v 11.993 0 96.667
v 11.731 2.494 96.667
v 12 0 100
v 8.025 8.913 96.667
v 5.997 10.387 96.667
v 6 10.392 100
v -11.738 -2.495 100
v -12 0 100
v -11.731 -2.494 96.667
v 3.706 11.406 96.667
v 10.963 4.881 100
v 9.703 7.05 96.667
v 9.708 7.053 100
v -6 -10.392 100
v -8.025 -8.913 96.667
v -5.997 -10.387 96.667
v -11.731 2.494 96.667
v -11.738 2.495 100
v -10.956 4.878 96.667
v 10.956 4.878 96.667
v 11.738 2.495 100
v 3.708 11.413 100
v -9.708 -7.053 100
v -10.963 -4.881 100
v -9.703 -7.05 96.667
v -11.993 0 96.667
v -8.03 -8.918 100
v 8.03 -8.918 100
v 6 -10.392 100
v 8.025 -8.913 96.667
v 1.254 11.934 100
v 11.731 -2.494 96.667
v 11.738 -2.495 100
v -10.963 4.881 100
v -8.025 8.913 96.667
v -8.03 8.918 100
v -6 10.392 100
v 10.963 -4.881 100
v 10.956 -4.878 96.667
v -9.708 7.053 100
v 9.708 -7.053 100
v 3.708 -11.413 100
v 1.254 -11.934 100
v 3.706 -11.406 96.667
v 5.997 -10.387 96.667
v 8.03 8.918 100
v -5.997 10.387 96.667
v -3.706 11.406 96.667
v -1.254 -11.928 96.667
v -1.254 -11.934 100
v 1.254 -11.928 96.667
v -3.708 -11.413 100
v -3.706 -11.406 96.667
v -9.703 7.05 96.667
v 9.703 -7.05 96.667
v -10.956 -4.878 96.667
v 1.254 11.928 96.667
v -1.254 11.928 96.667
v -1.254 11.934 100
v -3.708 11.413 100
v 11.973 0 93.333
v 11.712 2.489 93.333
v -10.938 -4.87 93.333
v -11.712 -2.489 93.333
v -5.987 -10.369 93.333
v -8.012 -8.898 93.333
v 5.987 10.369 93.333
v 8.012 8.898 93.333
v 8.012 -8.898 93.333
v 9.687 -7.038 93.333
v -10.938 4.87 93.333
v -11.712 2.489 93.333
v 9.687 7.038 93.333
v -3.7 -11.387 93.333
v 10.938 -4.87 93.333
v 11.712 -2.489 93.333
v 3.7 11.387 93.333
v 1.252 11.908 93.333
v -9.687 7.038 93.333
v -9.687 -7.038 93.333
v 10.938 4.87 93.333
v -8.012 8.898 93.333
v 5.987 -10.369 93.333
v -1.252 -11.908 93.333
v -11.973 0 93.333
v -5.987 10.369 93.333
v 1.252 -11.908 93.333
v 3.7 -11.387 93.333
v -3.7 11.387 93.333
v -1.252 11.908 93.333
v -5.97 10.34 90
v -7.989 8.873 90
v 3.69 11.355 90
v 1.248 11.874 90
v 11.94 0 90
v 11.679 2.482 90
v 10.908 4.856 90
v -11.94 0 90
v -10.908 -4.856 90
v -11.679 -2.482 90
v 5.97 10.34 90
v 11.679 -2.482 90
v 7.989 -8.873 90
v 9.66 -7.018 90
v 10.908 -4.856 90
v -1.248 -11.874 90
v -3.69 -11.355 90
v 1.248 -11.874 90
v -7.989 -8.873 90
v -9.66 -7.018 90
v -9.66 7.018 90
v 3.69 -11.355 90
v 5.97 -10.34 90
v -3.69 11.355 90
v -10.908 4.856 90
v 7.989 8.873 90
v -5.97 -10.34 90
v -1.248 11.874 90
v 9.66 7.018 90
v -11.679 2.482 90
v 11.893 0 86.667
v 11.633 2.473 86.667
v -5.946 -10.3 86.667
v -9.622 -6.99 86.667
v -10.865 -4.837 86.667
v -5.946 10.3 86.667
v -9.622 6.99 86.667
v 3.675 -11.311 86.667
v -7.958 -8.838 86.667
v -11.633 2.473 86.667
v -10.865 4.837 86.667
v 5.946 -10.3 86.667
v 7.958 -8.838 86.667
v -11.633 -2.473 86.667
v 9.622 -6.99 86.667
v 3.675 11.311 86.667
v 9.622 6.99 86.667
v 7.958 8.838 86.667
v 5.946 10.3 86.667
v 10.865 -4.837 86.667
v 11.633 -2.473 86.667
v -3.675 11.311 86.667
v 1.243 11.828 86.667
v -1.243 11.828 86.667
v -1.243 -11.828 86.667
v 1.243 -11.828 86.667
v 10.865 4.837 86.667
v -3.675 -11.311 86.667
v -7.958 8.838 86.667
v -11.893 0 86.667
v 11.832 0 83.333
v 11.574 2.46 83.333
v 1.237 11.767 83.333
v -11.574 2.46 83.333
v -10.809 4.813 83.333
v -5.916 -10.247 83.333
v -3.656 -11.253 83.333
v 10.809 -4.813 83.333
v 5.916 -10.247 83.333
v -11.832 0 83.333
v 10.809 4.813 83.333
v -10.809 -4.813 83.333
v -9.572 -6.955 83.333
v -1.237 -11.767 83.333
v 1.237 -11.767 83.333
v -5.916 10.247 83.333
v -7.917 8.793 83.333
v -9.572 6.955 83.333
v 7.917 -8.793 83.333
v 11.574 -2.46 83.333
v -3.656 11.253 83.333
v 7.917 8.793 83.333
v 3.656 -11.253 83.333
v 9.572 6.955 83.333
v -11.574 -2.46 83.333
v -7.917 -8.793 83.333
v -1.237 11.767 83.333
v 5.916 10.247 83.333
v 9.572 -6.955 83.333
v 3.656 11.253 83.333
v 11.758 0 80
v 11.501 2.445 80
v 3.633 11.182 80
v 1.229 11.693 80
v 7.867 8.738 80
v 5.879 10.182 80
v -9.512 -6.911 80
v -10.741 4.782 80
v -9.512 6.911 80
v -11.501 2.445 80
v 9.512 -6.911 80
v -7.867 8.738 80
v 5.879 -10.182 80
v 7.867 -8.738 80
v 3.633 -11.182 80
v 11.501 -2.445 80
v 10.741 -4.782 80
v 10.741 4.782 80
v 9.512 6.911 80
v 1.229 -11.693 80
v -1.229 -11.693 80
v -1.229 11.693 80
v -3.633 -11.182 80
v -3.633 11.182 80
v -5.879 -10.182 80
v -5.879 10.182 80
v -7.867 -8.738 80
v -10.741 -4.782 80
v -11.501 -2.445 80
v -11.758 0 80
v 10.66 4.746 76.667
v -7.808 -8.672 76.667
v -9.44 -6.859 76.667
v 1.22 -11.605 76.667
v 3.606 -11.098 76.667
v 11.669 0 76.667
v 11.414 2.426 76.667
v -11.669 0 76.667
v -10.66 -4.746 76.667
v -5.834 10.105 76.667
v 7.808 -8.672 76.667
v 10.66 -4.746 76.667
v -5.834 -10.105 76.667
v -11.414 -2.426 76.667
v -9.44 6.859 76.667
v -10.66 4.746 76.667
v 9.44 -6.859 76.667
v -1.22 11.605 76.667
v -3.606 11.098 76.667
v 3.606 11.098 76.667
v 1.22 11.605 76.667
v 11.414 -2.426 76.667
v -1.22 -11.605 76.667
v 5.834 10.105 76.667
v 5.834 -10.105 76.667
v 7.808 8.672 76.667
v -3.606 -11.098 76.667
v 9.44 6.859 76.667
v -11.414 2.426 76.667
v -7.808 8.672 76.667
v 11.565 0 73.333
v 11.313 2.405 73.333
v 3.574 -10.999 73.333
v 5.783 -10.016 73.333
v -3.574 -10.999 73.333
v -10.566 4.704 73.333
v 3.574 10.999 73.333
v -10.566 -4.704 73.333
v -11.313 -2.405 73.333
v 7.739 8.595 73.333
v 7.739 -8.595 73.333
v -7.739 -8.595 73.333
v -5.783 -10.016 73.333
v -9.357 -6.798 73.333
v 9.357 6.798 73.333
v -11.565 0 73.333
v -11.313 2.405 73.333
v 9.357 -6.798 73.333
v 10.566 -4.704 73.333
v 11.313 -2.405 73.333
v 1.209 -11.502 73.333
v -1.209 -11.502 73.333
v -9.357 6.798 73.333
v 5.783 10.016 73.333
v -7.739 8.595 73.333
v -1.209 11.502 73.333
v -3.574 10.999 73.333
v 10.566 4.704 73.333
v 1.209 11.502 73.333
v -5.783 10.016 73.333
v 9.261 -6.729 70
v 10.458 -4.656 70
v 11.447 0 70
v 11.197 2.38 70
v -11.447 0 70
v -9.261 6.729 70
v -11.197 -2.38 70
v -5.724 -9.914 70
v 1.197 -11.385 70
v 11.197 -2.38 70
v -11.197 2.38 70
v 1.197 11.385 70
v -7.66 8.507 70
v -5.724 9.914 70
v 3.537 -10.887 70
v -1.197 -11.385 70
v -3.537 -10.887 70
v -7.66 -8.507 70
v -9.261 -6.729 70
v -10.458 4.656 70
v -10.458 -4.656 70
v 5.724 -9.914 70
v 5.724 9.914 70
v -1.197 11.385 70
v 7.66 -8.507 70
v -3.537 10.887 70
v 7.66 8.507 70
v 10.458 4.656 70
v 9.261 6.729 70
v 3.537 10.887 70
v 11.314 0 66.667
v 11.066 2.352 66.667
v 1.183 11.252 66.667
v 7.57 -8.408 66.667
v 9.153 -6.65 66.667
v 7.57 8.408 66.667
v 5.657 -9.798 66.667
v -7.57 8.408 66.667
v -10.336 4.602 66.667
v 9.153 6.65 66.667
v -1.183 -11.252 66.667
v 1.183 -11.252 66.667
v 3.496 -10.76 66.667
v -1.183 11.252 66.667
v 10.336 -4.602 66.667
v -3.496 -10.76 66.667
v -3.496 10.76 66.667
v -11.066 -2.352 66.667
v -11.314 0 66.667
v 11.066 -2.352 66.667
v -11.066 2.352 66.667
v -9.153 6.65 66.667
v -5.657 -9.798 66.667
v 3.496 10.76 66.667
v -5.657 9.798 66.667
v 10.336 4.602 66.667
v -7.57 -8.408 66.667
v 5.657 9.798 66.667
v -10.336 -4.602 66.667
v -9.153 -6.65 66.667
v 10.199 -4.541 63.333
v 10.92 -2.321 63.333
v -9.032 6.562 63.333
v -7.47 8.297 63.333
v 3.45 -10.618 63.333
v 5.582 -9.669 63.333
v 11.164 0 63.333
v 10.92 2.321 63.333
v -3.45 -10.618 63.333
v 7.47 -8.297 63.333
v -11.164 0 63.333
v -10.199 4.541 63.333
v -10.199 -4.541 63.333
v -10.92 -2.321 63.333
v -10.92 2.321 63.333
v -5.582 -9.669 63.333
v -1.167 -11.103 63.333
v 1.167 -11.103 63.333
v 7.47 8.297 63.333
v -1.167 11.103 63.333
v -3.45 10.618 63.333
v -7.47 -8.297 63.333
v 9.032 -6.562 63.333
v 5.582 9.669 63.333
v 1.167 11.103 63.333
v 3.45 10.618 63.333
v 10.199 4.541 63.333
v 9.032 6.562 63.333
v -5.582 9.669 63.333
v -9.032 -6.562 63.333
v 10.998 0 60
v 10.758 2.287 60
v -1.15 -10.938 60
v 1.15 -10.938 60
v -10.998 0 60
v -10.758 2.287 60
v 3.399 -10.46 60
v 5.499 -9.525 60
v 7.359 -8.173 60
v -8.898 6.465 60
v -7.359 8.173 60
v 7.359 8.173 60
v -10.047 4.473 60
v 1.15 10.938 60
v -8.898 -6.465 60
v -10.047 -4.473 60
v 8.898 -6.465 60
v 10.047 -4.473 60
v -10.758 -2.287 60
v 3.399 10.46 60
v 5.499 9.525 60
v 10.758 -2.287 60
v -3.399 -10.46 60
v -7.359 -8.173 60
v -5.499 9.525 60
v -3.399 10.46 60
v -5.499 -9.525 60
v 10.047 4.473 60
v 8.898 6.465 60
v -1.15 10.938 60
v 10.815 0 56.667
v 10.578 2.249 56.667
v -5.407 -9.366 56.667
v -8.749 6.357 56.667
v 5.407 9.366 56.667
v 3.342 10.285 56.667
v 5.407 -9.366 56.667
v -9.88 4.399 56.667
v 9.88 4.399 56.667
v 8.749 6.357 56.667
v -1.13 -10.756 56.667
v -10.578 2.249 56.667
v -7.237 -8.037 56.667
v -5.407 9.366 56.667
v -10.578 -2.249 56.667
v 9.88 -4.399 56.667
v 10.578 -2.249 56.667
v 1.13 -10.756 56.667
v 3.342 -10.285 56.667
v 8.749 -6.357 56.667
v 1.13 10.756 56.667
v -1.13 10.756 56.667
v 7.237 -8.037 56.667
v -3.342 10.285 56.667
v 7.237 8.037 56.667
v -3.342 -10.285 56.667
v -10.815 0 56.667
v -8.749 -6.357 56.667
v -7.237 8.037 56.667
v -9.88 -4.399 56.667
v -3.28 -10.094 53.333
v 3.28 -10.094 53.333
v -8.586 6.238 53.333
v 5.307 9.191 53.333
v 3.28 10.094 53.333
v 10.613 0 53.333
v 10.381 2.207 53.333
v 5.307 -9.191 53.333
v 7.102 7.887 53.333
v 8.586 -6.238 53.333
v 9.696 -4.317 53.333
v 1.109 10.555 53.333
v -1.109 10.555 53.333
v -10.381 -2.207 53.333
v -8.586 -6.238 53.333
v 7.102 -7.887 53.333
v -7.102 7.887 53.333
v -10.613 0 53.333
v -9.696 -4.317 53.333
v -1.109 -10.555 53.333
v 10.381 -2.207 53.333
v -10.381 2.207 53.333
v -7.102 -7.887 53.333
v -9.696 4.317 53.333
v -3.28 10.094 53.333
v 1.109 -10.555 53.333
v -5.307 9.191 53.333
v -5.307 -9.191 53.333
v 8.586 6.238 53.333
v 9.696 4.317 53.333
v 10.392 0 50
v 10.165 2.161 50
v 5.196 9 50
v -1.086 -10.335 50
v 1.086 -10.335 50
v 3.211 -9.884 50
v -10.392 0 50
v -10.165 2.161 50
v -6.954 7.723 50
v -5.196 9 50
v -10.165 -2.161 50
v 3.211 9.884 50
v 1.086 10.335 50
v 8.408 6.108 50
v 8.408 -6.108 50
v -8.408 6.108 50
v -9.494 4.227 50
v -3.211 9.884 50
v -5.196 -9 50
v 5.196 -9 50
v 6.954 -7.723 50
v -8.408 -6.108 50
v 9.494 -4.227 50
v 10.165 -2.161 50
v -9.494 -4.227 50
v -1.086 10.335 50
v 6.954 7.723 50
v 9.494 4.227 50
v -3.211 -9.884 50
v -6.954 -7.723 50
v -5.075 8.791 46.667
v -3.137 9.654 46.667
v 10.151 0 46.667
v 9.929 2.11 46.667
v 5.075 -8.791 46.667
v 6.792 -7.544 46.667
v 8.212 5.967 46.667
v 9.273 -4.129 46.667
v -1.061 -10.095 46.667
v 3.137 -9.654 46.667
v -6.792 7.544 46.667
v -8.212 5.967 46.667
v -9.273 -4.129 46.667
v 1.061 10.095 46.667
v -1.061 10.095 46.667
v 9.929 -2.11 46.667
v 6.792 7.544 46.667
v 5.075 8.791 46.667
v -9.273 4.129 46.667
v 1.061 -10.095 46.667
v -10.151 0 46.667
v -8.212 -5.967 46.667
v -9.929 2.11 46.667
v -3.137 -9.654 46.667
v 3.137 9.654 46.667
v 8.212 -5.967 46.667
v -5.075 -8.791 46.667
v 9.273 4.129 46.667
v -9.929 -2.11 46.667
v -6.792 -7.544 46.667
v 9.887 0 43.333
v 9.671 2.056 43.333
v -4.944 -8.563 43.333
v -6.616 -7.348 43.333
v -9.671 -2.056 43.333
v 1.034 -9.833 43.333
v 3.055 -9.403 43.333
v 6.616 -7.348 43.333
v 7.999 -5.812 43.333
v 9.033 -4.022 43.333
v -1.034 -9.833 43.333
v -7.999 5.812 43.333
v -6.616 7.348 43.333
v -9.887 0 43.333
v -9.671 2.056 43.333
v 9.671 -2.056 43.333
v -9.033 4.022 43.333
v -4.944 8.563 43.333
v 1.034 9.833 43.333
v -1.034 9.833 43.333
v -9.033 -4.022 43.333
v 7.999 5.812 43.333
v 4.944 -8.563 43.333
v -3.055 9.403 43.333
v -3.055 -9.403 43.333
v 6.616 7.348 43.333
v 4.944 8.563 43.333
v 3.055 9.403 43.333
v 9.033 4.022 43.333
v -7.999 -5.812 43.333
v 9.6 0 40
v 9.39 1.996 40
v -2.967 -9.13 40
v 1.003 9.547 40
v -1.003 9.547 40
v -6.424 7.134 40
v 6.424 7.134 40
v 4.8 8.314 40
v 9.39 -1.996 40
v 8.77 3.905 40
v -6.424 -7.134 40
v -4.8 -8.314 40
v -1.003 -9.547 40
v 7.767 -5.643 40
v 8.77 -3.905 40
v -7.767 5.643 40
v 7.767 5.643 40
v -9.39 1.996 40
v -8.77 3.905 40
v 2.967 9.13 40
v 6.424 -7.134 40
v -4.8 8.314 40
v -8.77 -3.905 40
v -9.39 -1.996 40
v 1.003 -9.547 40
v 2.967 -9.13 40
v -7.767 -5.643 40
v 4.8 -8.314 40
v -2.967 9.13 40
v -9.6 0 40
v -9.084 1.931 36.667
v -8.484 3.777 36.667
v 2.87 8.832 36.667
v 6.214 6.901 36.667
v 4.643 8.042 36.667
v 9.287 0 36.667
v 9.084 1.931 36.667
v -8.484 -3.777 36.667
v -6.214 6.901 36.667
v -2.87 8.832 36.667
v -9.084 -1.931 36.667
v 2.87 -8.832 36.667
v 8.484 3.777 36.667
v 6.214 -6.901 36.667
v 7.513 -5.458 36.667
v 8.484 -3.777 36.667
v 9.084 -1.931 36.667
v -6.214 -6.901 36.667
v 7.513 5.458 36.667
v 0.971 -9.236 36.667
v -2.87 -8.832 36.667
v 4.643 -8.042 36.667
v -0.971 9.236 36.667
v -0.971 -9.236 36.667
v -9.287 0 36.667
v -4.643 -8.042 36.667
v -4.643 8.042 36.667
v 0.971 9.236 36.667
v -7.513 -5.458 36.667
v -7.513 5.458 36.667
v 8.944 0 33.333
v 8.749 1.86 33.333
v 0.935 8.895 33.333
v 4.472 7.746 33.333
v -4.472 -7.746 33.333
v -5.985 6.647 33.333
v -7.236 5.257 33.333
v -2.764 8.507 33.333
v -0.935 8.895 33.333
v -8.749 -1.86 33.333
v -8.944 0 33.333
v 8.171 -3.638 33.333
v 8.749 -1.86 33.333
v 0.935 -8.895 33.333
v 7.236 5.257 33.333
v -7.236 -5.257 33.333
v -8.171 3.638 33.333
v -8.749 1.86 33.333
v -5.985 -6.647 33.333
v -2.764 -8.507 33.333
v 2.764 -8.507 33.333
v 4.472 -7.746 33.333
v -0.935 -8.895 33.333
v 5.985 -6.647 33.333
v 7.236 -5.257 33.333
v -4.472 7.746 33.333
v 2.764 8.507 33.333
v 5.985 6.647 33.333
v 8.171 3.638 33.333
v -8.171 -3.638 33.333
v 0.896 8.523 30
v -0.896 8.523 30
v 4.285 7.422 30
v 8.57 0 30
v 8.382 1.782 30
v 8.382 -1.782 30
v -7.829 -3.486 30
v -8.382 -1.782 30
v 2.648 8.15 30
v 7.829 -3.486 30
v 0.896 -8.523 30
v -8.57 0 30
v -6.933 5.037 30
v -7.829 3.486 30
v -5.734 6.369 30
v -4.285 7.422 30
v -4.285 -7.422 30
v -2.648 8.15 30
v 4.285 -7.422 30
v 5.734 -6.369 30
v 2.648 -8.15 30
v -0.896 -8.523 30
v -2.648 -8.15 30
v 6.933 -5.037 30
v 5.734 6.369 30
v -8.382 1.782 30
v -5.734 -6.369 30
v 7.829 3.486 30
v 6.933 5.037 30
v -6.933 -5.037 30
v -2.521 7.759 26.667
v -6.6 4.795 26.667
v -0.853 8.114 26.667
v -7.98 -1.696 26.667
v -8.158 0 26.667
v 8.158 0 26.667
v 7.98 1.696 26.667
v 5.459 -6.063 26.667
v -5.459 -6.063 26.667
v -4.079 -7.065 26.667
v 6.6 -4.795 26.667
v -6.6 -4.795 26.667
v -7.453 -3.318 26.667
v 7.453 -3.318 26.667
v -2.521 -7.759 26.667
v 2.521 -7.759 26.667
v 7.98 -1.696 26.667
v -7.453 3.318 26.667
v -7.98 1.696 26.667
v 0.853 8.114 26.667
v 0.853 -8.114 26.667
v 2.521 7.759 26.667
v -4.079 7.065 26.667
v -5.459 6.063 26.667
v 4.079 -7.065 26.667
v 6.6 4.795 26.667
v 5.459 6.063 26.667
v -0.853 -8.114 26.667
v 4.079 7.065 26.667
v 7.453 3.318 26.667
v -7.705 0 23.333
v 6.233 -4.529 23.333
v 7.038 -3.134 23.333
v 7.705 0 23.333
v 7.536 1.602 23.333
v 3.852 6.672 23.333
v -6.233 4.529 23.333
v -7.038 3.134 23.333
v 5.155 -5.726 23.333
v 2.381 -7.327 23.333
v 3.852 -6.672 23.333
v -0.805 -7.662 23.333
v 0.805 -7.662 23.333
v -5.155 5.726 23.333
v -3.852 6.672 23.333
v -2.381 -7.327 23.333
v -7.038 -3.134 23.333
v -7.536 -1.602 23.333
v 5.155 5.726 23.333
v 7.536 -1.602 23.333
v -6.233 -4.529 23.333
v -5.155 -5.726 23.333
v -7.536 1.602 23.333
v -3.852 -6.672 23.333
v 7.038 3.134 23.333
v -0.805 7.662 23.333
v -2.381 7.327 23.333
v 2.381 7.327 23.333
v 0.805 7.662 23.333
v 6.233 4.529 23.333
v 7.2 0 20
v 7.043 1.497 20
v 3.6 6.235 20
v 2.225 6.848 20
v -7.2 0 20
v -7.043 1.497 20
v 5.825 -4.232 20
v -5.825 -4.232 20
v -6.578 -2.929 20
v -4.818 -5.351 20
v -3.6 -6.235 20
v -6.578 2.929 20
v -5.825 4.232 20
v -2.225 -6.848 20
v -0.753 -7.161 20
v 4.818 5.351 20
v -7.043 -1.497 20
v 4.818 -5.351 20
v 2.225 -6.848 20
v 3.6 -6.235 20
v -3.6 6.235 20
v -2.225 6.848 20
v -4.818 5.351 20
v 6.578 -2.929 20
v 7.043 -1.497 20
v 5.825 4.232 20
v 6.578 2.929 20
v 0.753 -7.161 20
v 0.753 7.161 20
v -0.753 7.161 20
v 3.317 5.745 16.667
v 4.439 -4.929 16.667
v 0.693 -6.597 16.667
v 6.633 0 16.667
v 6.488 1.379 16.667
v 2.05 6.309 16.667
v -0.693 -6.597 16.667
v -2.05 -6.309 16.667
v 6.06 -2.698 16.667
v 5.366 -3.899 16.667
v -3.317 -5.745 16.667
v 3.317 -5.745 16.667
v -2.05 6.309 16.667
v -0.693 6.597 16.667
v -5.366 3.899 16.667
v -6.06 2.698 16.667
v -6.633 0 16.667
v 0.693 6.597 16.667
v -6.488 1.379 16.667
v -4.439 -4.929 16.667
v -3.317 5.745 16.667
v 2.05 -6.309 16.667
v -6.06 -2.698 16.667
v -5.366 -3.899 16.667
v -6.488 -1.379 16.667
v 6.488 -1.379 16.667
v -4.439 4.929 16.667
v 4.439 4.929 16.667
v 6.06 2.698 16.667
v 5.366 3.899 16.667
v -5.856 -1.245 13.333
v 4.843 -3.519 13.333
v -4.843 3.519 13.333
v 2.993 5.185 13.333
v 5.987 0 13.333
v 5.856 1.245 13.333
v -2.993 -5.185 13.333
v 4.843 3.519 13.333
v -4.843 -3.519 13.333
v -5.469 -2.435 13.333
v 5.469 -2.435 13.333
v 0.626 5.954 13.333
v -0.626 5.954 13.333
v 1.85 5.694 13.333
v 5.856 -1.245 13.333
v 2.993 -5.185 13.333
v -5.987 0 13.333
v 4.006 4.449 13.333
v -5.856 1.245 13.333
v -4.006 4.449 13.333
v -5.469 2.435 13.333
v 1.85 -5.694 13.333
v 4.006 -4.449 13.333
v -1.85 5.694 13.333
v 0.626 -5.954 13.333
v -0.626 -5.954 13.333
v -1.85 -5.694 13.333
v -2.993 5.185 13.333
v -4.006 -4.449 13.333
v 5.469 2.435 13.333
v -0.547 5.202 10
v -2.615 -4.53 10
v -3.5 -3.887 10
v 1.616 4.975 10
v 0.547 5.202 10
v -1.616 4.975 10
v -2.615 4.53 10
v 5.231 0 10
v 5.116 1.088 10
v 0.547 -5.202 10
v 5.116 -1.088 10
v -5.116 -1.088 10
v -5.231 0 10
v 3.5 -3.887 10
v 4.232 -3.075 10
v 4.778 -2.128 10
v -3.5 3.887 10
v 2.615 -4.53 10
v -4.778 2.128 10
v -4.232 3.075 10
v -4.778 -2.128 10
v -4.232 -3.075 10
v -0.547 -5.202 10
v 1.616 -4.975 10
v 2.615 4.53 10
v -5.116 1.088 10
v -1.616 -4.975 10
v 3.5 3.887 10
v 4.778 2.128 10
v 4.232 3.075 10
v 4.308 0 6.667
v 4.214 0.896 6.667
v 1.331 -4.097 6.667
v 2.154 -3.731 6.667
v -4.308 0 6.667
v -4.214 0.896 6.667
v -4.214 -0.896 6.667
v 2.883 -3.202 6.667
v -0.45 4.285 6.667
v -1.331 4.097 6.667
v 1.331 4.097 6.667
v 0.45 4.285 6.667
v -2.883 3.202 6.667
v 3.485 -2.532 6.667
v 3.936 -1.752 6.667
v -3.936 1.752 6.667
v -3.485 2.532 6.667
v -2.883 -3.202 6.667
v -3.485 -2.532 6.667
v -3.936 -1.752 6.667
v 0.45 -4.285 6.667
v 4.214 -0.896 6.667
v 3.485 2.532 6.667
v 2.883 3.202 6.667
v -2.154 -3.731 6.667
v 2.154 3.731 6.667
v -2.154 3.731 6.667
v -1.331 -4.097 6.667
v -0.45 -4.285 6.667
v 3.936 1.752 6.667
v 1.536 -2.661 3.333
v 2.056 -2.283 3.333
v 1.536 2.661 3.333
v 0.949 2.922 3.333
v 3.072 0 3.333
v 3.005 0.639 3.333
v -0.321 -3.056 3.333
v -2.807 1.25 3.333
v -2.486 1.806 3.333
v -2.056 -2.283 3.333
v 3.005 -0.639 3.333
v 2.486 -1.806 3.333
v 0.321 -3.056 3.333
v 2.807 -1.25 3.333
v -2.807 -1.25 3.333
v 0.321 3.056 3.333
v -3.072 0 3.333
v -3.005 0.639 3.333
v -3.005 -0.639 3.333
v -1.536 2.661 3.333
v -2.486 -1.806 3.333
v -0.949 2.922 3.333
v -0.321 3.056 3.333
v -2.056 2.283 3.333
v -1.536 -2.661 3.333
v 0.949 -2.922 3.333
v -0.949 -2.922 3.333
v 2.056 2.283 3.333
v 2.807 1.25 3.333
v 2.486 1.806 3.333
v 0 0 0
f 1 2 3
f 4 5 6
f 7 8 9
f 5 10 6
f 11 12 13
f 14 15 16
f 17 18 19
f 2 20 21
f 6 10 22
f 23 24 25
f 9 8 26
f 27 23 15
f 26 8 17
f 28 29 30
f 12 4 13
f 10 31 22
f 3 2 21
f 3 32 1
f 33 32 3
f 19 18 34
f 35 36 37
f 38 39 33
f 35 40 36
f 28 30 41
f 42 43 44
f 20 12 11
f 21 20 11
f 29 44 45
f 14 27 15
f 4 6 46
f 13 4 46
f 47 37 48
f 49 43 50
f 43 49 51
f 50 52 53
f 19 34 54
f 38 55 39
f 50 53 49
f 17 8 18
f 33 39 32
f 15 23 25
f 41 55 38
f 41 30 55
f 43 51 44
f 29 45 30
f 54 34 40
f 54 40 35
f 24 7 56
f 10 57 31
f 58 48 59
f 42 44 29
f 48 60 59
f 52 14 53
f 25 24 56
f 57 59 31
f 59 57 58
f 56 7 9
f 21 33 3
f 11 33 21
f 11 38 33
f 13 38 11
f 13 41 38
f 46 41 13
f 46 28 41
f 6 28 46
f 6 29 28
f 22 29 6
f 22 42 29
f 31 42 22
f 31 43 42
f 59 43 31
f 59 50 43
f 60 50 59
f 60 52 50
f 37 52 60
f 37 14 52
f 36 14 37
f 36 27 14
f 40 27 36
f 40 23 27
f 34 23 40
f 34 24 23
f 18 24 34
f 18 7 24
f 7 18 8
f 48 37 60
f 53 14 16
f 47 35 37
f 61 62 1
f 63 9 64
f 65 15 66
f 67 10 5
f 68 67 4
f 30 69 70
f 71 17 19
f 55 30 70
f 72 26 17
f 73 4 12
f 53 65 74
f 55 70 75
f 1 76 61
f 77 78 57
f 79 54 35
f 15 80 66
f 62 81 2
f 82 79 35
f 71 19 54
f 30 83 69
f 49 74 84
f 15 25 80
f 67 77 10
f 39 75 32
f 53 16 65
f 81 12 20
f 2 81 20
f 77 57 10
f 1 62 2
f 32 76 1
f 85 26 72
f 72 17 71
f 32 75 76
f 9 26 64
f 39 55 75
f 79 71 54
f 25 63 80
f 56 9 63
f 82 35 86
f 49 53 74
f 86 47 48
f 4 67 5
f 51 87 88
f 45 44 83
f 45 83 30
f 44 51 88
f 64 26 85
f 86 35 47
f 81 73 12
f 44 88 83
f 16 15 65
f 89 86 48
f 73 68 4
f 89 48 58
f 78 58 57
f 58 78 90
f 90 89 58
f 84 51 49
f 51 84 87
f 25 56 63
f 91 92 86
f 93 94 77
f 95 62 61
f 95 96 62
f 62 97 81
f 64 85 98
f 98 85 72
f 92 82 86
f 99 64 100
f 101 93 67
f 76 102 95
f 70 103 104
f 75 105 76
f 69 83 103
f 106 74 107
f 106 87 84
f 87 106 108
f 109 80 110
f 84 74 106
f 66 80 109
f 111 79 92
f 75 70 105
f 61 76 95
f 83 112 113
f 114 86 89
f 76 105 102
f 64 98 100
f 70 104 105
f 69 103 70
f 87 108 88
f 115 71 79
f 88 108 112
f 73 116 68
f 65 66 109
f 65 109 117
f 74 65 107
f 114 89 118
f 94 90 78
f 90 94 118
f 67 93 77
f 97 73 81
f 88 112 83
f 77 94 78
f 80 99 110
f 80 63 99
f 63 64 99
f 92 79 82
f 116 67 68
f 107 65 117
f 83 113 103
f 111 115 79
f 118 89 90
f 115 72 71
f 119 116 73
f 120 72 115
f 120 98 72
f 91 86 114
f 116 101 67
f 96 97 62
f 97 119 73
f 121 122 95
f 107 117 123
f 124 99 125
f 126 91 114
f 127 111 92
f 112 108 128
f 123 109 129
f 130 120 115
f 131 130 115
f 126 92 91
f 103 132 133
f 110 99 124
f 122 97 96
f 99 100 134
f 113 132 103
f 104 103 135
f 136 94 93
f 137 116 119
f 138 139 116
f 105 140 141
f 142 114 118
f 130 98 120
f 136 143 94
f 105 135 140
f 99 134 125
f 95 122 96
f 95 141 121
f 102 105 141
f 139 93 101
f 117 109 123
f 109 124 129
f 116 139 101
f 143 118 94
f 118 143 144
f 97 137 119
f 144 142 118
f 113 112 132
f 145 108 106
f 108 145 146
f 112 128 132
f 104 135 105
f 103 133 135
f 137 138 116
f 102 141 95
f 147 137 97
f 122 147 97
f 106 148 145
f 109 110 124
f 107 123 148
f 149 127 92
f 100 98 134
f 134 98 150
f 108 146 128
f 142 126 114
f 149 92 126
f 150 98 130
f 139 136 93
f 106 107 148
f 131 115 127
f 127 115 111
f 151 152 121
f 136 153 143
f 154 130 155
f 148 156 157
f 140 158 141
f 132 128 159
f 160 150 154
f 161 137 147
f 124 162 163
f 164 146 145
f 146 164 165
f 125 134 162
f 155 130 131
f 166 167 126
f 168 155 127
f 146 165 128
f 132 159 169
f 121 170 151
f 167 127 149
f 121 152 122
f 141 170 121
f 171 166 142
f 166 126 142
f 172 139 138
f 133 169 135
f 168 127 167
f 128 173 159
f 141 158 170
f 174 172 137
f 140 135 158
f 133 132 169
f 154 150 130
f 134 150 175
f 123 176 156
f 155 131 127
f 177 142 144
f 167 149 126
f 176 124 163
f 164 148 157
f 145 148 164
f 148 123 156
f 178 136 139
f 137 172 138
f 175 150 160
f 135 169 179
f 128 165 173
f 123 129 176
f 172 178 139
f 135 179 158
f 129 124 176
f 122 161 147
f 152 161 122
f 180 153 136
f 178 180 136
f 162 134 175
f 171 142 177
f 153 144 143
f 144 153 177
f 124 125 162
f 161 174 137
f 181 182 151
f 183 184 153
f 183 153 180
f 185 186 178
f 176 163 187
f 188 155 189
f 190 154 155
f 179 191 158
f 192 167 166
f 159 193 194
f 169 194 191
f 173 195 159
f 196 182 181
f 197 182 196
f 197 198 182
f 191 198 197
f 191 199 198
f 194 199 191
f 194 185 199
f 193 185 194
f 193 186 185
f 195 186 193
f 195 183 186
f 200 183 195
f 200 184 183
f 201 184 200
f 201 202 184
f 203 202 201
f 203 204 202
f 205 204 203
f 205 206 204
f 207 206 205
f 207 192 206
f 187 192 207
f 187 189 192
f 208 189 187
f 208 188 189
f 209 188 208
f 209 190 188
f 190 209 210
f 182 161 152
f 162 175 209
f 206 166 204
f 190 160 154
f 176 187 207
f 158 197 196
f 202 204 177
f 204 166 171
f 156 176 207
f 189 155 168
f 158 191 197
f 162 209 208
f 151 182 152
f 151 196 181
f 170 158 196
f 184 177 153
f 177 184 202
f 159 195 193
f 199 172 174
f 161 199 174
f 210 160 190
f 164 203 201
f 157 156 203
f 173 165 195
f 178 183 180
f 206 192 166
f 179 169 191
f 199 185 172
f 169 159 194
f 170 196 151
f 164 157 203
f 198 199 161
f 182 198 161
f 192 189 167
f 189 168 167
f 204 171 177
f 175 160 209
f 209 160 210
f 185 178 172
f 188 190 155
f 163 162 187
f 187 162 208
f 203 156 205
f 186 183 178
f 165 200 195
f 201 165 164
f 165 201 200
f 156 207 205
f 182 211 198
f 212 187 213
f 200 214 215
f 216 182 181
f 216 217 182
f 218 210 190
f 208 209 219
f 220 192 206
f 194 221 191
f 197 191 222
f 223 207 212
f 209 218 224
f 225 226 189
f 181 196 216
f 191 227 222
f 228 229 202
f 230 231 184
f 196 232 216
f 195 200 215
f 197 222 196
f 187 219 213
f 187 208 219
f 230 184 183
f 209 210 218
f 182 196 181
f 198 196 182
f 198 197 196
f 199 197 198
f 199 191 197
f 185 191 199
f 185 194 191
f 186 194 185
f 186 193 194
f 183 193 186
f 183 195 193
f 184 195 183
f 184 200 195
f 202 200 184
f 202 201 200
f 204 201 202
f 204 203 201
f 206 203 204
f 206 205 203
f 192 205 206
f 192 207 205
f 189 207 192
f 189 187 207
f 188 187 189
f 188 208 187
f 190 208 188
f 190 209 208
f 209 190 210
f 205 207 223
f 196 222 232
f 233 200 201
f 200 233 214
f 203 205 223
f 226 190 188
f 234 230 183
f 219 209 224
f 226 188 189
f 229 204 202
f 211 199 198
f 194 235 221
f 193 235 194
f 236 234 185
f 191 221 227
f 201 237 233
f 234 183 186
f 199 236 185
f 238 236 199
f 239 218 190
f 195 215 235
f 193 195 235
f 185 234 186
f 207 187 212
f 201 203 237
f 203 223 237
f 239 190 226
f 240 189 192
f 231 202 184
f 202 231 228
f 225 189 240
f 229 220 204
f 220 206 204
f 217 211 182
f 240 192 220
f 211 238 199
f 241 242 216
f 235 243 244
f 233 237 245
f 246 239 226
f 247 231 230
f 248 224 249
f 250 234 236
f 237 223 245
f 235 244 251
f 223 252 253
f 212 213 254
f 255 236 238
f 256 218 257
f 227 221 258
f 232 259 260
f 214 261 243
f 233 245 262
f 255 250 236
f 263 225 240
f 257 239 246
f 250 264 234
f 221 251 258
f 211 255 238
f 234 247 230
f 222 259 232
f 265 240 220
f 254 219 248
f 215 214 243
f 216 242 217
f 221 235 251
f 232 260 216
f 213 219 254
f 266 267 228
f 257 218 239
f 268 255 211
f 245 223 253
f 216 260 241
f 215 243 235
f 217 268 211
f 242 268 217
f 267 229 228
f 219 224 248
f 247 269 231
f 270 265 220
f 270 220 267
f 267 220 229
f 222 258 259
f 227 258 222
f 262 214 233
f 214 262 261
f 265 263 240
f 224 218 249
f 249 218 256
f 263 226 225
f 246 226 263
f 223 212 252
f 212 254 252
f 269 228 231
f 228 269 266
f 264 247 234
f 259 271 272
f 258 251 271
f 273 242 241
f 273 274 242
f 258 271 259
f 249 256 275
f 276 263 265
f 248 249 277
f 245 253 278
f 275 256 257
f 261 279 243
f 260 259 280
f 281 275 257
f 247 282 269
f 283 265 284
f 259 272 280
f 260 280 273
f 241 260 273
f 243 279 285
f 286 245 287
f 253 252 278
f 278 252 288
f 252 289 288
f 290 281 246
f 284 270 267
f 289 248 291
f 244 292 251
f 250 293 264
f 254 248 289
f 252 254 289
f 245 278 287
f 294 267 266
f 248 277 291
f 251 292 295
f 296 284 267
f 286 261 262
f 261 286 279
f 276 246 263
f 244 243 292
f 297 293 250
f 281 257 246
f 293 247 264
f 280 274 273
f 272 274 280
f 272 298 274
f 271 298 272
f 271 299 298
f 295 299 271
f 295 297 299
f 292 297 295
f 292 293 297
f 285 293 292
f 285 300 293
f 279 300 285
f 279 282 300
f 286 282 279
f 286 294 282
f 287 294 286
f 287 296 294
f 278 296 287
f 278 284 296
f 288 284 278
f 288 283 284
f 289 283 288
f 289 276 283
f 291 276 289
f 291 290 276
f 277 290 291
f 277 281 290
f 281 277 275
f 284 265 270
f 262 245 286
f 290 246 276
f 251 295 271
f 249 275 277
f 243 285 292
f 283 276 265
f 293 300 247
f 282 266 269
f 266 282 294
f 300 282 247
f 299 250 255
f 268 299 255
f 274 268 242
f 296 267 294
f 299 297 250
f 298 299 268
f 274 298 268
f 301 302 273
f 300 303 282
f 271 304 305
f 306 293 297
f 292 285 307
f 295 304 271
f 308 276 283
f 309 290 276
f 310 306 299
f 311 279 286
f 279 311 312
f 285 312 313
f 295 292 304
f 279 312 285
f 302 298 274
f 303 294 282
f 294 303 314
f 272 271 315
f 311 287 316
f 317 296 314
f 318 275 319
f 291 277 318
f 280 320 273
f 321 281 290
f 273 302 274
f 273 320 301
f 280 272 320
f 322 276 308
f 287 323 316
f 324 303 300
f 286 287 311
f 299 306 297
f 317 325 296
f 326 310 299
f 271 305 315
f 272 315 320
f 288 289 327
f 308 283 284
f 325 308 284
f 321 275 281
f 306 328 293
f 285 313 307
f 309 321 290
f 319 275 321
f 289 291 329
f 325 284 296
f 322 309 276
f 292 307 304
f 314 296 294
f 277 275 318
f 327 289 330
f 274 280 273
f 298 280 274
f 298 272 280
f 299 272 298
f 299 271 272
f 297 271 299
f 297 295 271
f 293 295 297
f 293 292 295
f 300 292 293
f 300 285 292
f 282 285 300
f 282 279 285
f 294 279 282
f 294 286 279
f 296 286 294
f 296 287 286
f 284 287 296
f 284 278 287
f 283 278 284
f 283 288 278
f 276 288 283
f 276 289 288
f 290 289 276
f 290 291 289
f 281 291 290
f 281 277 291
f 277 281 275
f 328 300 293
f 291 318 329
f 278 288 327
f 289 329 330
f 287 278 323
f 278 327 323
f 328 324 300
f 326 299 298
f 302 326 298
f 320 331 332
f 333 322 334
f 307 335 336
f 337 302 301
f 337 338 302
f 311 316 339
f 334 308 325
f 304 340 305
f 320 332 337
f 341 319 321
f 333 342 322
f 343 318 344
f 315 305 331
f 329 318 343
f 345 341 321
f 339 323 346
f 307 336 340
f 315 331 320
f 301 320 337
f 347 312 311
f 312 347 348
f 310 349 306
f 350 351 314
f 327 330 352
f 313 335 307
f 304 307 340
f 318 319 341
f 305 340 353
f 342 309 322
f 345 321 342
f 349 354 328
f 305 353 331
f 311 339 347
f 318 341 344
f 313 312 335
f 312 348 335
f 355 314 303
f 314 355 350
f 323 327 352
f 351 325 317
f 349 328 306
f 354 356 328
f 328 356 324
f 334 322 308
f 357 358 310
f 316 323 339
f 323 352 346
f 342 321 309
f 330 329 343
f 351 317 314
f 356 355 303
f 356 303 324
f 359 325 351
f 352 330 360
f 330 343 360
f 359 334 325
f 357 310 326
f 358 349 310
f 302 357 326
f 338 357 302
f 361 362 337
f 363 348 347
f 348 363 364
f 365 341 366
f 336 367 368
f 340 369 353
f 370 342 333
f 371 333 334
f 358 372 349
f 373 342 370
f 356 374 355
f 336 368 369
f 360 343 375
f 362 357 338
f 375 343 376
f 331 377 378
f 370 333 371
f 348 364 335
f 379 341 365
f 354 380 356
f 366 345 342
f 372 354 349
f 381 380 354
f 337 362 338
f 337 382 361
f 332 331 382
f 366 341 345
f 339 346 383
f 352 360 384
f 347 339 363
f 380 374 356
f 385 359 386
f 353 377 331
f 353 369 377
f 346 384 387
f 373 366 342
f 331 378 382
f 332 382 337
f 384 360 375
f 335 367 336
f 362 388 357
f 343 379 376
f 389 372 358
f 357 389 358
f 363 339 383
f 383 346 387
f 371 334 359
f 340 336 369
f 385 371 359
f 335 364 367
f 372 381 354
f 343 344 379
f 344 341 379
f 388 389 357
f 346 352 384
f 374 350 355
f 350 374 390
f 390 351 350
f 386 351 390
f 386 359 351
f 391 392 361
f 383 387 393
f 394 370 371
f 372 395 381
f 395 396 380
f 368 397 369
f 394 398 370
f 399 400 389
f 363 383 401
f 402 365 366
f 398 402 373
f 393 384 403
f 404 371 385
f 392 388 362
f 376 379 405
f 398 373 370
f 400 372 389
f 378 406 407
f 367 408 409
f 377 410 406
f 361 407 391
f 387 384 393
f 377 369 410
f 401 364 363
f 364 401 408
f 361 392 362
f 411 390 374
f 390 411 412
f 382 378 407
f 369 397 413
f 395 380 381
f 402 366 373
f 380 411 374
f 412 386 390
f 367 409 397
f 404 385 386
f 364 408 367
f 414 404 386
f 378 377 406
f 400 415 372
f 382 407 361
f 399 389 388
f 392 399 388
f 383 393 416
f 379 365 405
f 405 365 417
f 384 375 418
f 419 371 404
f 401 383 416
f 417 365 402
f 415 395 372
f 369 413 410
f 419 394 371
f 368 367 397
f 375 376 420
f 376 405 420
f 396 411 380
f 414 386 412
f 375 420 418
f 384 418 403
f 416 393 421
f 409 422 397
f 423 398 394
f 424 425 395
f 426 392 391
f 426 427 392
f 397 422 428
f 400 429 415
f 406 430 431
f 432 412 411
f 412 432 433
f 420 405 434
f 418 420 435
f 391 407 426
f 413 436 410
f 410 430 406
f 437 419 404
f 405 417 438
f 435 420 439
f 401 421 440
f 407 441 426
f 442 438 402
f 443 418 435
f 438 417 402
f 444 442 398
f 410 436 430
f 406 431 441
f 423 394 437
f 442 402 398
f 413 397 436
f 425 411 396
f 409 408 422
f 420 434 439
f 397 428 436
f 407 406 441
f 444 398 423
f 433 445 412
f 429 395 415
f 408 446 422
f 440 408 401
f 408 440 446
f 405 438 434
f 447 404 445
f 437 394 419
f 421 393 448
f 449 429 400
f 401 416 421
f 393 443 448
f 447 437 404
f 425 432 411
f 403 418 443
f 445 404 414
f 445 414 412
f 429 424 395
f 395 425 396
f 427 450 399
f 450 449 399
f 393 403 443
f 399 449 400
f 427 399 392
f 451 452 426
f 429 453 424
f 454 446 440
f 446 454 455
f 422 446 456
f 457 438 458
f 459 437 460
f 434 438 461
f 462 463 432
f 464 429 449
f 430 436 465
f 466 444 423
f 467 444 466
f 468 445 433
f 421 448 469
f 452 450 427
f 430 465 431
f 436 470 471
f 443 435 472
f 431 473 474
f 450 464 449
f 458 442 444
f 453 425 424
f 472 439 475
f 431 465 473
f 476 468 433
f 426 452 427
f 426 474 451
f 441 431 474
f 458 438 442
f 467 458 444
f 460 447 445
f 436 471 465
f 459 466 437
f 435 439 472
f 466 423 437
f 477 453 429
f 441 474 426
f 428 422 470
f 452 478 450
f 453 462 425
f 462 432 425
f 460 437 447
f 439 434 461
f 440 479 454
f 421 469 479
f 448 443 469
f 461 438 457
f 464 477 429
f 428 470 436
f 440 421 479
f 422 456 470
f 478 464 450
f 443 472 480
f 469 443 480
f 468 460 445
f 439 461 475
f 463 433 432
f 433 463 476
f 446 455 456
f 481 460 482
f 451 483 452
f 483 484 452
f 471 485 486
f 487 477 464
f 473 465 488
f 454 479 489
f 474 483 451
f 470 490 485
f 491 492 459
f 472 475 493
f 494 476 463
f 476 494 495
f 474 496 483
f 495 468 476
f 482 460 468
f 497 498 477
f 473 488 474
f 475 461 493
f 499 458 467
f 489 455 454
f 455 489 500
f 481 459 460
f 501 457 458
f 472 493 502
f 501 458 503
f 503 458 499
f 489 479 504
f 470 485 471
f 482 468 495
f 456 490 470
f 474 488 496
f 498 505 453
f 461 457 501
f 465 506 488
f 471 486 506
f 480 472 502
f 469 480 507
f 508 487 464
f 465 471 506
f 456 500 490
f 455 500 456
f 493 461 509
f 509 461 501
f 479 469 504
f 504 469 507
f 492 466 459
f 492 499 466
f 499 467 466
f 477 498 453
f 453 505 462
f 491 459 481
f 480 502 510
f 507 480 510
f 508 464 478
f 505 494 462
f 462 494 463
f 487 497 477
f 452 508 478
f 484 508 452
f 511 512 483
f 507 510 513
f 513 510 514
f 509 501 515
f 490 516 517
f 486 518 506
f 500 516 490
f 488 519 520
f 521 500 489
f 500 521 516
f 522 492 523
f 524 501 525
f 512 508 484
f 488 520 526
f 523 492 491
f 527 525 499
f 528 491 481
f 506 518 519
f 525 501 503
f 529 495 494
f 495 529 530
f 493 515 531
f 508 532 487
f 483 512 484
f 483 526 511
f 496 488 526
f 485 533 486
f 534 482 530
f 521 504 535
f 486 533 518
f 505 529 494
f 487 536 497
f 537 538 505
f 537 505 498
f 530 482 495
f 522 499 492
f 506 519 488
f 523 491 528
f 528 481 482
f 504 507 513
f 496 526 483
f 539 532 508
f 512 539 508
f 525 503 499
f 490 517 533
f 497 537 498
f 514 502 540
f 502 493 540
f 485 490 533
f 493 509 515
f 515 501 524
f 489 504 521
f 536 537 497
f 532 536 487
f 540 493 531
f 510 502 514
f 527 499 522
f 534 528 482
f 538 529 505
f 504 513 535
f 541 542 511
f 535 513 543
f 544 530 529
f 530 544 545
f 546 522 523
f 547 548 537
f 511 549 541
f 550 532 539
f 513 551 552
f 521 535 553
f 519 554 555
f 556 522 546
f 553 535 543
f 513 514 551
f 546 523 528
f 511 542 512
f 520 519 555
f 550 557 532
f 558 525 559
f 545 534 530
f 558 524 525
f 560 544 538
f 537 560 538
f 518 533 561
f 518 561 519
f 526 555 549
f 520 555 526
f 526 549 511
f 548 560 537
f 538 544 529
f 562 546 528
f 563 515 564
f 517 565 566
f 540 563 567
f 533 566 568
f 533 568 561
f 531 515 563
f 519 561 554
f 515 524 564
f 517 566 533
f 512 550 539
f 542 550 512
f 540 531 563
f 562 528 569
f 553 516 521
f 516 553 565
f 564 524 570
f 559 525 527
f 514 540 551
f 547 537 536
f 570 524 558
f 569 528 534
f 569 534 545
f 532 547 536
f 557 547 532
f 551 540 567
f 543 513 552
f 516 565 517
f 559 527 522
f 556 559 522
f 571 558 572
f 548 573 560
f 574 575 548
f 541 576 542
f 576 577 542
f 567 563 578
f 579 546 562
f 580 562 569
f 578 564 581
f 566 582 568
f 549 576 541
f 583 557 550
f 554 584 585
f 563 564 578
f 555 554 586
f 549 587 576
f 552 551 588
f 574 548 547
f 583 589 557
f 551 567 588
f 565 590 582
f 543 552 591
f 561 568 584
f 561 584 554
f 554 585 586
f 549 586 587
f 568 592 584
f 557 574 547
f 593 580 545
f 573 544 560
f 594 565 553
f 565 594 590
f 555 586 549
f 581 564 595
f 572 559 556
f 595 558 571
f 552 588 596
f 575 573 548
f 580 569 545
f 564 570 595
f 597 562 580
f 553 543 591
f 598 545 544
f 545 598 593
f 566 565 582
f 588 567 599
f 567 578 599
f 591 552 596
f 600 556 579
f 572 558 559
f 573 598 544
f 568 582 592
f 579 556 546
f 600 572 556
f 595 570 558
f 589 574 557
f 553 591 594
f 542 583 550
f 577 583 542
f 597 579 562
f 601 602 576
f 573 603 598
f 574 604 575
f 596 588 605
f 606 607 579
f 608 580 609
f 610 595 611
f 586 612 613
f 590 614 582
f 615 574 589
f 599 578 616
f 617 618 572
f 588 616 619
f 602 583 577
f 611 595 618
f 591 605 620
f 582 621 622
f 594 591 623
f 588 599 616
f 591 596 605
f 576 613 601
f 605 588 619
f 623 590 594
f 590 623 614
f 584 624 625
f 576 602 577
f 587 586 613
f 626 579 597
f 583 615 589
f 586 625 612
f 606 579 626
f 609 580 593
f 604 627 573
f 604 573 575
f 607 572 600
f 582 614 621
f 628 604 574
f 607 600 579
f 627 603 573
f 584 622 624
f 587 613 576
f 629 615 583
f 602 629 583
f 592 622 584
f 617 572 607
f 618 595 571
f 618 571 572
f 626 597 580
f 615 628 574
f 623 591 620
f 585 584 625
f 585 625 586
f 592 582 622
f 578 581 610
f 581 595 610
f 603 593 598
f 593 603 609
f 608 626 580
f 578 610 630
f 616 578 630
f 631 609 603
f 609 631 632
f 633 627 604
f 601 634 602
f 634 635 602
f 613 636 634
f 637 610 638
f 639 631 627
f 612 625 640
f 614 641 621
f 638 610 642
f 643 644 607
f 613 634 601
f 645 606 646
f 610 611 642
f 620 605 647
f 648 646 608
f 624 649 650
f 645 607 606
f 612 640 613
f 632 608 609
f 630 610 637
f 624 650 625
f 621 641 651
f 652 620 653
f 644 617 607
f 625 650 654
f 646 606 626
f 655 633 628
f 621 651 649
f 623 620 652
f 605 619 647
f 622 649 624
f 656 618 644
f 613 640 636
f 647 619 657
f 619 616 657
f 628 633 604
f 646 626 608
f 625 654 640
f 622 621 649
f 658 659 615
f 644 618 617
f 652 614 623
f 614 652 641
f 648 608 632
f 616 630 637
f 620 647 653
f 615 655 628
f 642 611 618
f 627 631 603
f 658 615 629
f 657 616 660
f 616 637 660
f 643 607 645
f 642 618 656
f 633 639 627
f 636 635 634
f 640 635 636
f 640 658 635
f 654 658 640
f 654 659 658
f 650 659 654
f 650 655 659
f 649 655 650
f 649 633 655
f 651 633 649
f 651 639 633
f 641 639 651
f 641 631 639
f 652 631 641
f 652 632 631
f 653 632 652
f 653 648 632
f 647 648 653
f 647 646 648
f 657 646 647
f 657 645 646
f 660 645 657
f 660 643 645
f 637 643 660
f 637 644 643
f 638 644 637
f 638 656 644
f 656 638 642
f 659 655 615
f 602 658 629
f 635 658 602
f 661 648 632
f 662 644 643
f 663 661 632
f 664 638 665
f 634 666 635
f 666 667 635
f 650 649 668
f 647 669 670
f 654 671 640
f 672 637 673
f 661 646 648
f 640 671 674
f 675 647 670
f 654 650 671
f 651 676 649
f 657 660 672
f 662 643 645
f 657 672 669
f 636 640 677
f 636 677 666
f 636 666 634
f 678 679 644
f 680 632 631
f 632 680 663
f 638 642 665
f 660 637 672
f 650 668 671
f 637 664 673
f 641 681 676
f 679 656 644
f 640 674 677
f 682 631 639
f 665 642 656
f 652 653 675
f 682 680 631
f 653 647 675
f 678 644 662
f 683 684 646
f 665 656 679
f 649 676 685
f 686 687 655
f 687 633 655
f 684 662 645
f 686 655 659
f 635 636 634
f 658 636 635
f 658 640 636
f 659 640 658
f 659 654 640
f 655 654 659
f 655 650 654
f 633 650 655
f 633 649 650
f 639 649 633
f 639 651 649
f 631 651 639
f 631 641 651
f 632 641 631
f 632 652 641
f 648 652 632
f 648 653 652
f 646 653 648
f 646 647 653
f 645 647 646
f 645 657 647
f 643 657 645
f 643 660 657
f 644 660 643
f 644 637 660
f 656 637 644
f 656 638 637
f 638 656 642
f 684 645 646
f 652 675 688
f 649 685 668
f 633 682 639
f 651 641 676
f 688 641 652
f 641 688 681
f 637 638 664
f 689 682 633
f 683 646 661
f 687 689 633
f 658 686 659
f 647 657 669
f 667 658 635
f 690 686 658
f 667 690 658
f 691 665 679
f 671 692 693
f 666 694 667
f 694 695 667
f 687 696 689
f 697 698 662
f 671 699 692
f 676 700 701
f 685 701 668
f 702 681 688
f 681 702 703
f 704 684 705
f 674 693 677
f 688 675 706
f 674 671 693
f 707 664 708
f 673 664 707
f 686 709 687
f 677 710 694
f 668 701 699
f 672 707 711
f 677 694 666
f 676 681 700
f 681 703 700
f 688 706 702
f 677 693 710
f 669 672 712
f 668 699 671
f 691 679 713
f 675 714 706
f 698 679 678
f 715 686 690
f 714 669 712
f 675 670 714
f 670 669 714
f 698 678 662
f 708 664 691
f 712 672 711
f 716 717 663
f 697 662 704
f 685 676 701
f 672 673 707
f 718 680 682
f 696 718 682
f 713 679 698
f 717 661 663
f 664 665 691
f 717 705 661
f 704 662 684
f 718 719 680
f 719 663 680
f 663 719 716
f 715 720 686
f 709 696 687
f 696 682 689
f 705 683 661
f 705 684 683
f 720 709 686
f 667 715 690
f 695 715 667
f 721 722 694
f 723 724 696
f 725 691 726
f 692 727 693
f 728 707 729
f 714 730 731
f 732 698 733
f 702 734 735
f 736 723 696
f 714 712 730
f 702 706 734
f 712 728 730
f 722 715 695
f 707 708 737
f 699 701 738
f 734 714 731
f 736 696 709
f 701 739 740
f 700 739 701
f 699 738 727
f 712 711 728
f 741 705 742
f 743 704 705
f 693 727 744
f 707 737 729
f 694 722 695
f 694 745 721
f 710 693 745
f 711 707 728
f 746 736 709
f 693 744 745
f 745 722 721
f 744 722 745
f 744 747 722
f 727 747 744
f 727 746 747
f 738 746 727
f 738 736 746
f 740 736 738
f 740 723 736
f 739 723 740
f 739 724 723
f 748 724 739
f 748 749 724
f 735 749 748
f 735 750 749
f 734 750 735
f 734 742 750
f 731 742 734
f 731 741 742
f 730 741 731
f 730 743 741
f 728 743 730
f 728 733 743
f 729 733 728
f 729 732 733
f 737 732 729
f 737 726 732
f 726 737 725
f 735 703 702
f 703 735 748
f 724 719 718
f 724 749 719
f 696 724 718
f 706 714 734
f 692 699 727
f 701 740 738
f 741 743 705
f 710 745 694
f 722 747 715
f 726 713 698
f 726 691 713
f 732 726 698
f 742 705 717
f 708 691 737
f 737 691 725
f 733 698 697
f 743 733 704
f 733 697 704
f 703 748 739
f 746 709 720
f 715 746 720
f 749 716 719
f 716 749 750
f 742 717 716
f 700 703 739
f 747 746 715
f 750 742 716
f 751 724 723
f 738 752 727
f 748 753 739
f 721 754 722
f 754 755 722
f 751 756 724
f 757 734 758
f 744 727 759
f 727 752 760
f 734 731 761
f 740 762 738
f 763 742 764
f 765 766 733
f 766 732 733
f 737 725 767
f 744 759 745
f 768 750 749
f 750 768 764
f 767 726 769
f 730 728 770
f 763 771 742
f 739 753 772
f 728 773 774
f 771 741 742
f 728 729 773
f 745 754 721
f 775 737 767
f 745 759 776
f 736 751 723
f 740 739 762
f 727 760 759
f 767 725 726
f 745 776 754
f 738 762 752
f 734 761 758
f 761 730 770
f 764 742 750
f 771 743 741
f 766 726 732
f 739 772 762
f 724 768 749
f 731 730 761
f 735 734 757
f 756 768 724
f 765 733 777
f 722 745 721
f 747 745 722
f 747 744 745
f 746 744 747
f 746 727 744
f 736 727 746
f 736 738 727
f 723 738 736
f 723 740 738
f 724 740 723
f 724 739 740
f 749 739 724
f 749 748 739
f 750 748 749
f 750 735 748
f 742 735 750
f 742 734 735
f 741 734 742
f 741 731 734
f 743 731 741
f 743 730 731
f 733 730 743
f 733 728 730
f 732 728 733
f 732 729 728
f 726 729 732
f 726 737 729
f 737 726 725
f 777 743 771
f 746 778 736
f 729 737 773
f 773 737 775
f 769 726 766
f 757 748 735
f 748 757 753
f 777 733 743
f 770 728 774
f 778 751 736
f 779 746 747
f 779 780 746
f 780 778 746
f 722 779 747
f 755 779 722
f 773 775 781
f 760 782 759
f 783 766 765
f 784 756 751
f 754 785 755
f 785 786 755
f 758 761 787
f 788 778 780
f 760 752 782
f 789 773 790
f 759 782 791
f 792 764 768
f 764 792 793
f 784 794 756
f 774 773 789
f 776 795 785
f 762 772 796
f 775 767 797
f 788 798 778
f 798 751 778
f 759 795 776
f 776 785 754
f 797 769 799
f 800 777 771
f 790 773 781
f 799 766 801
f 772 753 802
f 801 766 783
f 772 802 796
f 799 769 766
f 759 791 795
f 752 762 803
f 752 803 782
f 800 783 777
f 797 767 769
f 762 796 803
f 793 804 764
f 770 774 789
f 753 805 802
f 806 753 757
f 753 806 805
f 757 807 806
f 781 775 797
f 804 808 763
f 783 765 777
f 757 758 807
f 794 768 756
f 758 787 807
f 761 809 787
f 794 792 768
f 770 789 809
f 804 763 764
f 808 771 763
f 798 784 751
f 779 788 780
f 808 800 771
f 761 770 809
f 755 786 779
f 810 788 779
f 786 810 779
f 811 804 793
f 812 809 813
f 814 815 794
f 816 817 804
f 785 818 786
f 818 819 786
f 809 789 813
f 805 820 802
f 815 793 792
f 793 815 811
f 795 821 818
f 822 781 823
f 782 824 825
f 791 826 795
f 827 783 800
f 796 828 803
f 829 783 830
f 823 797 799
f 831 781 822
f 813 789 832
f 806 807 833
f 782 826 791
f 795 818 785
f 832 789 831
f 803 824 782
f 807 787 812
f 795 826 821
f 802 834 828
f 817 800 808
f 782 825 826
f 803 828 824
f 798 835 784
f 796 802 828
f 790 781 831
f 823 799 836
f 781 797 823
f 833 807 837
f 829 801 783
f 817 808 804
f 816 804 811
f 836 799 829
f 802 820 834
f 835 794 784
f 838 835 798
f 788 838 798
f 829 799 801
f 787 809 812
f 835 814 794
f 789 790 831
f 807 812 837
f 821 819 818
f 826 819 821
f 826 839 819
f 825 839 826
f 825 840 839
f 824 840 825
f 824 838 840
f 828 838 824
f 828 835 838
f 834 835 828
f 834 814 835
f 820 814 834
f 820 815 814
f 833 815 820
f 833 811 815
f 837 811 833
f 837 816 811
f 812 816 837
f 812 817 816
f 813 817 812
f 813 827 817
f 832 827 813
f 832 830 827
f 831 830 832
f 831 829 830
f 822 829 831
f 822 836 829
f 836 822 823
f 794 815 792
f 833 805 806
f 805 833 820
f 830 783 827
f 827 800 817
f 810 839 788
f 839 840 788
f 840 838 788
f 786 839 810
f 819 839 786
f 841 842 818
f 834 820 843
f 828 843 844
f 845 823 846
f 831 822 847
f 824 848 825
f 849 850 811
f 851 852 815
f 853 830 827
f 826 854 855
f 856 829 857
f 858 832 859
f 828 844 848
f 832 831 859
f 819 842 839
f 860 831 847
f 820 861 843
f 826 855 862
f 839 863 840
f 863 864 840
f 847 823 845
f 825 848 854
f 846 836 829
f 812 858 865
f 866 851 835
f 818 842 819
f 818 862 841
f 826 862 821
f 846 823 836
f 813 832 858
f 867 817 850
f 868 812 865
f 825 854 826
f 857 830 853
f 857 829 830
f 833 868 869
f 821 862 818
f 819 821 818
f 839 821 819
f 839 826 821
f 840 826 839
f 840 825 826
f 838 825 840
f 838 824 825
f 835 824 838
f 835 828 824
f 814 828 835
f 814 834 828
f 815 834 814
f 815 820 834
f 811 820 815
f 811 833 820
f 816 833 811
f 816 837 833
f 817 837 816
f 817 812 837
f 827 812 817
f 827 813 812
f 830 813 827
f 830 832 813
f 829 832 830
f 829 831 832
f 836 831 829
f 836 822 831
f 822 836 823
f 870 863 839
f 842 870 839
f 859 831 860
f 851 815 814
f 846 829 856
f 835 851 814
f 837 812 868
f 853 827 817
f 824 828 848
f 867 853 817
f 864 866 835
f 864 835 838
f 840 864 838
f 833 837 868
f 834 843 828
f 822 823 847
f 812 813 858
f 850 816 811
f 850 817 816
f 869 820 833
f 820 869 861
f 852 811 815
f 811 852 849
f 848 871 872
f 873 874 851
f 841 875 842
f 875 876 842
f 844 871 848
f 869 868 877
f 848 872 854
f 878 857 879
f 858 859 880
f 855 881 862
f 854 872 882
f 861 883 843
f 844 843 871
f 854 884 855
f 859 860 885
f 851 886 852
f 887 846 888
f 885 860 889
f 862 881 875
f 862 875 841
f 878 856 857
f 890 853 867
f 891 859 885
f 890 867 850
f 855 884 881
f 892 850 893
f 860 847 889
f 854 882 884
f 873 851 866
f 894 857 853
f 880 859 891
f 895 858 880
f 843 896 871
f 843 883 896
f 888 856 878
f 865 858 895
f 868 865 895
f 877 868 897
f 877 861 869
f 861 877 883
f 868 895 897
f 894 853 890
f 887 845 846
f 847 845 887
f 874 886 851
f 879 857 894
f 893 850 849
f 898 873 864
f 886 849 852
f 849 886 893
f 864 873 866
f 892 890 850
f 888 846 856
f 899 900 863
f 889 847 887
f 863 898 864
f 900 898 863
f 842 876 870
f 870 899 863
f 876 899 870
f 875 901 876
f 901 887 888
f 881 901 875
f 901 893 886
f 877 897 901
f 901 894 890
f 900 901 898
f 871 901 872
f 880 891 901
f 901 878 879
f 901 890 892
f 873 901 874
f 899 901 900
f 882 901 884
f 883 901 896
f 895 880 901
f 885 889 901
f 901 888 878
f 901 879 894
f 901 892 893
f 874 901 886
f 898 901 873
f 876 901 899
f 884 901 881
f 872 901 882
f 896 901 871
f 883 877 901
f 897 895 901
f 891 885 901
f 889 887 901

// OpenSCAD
/* Elliptical ogive */

/* 

y= R * sqrt(1 - (x^2)/(L^2))

*/

L= 100;
R=24/2;
nof = 30;

$fn=30;
H2=L/nof;
x1= 0;
x2=0;
A1=0;
A2= 0;
module ogive()
{

	for (i=[1:nof]) {

assign(x1 = ((L/nof)*(i-1)),
x2 = ((L/nof)*i),
A1 = R * sqrt(1 - (pow(((L/nof)*(i-1)), 2) / pow(L,2))),
A2 = R * sqrt(1 - (pow(((L/nof)*i), 2) / pow(L,2))),
H1= (L/nof)*i)
		{
	  translate ([0,0, L- H1]) cylinder (r1 = A2, r2 = A1 , h= H2);
		echo("i=", i ,"h=",H1,"r1:",A1,"r2:", A2, "x1:", x1, "x2", x2);
		}
	}
}

ogive();
